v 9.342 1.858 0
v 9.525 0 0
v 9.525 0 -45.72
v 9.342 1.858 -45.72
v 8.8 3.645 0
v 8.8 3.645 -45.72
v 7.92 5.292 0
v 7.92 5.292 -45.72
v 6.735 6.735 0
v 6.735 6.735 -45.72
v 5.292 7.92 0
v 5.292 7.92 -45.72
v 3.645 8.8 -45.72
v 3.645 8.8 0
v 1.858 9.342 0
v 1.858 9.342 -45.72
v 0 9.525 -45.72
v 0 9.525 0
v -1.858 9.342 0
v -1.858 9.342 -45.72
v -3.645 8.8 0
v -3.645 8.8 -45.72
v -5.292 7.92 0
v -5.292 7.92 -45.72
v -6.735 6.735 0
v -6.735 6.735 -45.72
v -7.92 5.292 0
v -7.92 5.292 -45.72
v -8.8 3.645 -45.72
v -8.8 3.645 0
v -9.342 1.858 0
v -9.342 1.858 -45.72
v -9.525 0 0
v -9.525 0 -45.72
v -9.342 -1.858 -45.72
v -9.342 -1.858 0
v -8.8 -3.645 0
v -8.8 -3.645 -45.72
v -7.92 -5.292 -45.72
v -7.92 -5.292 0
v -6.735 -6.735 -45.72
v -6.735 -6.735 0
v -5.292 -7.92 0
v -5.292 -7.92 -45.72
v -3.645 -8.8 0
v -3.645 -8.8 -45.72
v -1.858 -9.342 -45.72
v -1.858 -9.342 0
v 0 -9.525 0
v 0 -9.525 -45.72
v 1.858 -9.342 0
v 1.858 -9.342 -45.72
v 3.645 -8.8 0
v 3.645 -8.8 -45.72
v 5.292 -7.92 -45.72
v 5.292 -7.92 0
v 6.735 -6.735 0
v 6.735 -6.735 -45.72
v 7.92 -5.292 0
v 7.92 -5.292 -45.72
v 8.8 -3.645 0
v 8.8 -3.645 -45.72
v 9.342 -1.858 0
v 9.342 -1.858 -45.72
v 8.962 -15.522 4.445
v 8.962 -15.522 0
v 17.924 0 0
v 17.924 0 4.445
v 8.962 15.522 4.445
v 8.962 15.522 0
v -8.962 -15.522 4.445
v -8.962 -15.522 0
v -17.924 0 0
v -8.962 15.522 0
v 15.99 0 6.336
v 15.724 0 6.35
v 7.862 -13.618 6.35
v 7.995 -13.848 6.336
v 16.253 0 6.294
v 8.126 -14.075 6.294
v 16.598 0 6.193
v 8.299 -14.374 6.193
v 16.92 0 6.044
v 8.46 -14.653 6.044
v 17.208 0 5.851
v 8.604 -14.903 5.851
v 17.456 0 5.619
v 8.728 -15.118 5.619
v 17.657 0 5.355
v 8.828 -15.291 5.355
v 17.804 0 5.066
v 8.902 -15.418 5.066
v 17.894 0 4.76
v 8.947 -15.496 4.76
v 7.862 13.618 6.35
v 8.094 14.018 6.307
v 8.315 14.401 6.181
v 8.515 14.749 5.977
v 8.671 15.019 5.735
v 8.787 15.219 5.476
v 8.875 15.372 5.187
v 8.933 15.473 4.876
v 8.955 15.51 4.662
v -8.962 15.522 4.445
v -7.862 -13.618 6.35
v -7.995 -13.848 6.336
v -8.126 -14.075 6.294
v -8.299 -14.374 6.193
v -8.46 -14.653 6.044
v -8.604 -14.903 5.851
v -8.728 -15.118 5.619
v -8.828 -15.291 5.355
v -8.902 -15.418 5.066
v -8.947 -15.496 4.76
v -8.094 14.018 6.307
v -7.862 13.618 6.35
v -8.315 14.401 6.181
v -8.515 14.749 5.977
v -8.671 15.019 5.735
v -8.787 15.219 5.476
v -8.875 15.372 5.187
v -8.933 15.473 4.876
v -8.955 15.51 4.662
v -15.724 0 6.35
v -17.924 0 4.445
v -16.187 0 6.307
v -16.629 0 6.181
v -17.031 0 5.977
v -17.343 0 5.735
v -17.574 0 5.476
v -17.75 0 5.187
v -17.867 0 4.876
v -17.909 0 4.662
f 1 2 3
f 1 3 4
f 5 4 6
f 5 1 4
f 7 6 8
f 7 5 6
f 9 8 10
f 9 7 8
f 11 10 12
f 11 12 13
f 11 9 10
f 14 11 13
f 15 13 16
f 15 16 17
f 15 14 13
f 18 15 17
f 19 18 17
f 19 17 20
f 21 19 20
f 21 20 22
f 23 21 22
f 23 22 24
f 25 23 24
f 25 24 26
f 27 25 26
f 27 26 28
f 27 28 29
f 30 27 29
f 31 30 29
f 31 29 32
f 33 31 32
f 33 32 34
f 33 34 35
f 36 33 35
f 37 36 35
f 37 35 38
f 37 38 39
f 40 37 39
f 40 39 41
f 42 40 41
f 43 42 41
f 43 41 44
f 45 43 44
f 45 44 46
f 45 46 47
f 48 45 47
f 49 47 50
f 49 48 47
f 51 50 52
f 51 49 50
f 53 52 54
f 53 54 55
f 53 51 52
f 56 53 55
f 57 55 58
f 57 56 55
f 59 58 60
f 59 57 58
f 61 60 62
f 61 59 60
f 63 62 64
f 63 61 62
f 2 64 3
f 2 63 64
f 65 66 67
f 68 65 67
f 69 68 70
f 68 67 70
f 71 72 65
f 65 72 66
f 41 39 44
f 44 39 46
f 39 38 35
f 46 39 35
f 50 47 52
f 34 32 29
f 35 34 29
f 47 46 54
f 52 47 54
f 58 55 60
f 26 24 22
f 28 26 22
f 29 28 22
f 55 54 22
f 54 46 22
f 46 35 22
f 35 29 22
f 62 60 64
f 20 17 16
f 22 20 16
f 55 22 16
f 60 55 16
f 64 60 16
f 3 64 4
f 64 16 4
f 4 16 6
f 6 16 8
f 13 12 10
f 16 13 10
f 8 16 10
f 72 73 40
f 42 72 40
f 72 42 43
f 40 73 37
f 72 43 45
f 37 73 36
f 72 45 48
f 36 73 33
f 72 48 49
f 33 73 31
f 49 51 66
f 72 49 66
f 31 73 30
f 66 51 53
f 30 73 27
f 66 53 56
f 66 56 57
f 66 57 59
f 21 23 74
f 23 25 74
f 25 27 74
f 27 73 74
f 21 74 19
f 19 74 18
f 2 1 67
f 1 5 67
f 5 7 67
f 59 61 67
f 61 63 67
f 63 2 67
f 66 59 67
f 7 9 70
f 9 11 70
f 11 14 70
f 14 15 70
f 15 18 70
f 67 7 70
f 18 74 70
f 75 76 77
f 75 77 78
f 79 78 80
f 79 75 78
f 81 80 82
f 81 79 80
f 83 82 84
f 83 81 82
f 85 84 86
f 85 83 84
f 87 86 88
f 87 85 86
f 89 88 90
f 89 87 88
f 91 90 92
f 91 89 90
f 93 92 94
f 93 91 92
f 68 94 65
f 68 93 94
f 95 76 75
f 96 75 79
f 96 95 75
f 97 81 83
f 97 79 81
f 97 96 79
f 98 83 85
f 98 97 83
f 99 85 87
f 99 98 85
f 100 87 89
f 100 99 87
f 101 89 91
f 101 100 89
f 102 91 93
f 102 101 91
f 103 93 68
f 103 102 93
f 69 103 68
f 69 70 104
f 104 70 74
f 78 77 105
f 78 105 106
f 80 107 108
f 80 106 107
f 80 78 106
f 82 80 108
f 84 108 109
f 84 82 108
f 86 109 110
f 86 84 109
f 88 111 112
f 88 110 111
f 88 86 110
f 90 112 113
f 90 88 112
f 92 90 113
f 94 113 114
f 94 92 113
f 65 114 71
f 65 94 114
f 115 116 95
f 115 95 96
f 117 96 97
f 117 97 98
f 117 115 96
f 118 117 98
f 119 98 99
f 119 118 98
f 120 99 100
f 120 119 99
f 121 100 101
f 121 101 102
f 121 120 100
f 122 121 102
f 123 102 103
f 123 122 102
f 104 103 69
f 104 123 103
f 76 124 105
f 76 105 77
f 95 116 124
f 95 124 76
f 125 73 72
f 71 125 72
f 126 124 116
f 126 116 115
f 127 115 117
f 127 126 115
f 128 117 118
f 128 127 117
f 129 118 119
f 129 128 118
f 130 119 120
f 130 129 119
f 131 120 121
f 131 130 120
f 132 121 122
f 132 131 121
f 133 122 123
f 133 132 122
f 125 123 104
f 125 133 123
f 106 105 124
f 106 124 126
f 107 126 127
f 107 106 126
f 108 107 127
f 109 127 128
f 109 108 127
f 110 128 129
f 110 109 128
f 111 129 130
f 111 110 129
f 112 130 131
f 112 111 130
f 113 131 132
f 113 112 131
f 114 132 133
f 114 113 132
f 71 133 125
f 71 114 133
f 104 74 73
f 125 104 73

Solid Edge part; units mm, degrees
sketch "Sketch1" plane through (0, 0, 0) normal (0, 0, 1) x (1, 0, 0)
  circle A0 centre (0, 0) radius 9.525
extrude "Protrusion1" add sketch "Sketch1" against normal blind 45.72
sketch "Sketch2" plane through (0, 0, 0) normal (0, 0, 1) x (1, 0, 0)
  line L0 (8.9619, -15.5225) -> (17.9238, 0)
  line L1 (17.9238, 0) -> (8.9619, 15.5225)
  line L2 (8.9619, 15.5225) -> (-8.9619, 15.5225)
  line L3 (-8.9619, 15.5225) -> (-17.9238, 0)
  line L4 (-17.9238, 0) -> (-8.9619, -15.5225)
  line L5 (-8.9619, -15.5225) -> (8.9619, -15.5225)
extrude "ExtrudedProtrusion_2" add sketch "Sketch2" along normal blind 6.35
fillet "Round_1" radius 1.905 6 edges at (13.4429, -7.7612, 6.35) (0, -15.5225, 6.35) (-13.4429, -7.7612, 6.35) (-13.4429, 7.7612, 6.35) (0, 15.5225, 6.35) (13.4429, 7.7612, 6.35)
